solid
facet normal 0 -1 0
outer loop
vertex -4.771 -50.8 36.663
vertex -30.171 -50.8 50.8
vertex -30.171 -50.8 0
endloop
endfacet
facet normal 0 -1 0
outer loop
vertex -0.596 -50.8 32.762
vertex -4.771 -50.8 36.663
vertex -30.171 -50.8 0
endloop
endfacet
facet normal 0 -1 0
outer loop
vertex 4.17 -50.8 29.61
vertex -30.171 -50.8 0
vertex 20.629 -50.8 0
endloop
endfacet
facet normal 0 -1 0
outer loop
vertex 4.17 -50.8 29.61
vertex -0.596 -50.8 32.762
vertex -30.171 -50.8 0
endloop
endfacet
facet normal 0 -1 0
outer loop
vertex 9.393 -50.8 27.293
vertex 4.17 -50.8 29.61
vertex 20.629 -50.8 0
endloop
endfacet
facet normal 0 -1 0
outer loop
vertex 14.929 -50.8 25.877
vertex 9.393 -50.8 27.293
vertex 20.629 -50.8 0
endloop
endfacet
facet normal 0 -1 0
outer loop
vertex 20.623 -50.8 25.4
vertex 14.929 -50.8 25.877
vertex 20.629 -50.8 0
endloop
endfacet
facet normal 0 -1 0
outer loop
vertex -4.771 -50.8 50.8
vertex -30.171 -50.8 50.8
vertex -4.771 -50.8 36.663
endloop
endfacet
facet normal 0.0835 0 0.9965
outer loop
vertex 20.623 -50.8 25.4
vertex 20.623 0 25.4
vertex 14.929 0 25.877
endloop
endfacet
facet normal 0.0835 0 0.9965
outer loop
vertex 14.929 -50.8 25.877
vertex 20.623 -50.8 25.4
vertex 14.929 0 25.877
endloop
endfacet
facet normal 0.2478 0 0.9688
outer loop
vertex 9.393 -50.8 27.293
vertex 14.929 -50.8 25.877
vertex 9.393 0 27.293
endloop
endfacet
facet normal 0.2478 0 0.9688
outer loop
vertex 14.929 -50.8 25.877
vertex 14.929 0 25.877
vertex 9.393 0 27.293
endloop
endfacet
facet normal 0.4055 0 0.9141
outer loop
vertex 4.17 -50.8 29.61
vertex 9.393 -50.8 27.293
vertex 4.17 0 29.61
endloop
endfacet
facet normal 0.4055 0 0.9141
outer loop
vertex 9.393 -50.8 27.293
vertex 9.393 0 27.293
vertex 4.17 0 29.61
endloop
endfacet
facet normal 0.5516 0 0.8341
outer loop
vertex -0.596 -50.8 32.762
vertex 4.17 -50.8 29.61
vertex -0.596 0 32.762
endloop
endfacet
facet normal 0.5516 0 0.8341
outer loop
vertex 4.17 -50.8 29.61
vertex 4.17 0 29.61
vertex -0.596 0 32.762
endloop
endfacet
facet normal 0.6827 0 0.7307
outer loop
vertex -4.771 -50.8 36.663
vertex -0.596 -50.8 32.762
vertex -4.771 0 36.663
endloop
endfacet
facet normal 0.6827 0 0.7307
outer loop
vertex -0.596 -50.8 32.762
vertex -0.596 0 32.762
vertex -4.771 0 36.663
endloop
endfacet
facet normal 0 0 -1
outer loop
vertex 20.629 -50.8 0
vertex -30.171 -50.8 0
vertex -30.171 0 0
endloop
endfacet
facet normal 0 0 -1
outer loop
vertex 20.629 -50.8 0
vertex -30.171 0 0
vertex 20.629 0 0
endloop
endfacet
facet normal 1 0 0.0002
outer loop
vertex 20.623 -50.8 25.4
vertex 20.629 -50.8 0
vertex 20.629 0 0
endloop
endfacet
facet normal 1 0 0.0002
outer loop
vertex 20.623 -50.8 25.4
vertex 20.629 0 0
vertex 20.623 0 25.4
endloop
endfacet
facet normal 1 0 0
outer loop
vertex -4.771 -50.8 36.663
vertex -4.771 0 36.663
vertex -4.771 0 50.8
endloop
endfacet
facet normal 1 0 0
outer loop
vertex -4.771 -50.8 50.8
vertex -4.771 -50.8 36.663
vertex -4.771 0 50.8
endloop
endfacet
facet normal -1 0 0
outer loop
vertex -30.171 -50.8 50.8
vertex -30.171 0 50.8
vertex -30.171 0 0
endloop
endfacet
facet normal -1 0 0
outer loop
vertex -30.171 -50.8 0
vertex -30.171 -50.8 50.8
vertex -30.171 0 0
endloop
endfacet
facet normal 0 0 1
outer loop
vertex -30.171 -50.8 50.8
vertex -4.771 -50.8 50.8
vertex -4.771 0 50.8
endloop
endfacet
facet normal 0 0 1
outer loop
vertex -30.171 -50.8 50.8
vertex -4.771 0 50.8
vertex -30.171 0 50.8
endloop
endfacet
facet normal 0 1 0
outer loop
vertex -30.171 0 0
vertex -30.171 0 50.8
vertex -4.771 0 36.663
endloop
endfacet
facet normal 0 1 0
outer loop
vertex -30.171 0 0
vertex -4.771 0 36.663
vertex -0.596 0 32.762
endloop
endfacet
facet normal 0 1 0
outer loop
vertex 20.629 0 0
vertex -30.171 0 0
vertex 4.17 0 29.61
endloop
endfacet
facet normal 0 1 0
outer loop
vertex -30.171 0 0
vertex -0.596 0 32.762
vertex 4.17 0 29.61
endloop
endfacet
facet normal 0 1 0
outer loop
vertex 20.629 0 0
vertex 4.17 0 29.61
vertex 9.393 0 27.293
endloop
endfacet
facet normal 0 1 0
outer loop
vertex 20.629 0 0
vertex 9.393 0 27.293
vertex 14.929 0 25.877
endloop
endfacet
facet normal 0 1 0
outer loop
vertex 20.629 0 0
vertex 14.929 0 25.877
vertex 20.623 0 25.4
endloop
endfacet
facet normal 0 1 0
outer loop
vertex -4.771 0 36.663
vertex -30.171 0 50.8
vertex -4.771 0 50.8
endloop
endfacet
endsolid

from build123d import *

# Parameters (mm, degrees)
F1_DEPTH = 50.8


with BuildPart() as f1:
    # F0 (on Front) → F1 (new body)
    with BuildSketch(Plane.XZ):
        Polygon((-30.170836, 0), (20.628821, 0), (20.623103, 25.4), (-4.770836, 25.4), (-4.770836, 36.663294), (-4.770836, 50.8), (-30.170836, 50.8), align=None)
        with BuildLine():
            Line((-4.770836, 25.4), (20.623103, 25.4))
            ThreePointArc((20.623103, 25.4), (6.733233, 28.342164), (-4.770836, 36.663294))
            Line((-4.770836, 36.663294), (-4.770836, 25.4))
        make_face()
    extrude(amount=F1_DEPTH)


solid = f1.part
